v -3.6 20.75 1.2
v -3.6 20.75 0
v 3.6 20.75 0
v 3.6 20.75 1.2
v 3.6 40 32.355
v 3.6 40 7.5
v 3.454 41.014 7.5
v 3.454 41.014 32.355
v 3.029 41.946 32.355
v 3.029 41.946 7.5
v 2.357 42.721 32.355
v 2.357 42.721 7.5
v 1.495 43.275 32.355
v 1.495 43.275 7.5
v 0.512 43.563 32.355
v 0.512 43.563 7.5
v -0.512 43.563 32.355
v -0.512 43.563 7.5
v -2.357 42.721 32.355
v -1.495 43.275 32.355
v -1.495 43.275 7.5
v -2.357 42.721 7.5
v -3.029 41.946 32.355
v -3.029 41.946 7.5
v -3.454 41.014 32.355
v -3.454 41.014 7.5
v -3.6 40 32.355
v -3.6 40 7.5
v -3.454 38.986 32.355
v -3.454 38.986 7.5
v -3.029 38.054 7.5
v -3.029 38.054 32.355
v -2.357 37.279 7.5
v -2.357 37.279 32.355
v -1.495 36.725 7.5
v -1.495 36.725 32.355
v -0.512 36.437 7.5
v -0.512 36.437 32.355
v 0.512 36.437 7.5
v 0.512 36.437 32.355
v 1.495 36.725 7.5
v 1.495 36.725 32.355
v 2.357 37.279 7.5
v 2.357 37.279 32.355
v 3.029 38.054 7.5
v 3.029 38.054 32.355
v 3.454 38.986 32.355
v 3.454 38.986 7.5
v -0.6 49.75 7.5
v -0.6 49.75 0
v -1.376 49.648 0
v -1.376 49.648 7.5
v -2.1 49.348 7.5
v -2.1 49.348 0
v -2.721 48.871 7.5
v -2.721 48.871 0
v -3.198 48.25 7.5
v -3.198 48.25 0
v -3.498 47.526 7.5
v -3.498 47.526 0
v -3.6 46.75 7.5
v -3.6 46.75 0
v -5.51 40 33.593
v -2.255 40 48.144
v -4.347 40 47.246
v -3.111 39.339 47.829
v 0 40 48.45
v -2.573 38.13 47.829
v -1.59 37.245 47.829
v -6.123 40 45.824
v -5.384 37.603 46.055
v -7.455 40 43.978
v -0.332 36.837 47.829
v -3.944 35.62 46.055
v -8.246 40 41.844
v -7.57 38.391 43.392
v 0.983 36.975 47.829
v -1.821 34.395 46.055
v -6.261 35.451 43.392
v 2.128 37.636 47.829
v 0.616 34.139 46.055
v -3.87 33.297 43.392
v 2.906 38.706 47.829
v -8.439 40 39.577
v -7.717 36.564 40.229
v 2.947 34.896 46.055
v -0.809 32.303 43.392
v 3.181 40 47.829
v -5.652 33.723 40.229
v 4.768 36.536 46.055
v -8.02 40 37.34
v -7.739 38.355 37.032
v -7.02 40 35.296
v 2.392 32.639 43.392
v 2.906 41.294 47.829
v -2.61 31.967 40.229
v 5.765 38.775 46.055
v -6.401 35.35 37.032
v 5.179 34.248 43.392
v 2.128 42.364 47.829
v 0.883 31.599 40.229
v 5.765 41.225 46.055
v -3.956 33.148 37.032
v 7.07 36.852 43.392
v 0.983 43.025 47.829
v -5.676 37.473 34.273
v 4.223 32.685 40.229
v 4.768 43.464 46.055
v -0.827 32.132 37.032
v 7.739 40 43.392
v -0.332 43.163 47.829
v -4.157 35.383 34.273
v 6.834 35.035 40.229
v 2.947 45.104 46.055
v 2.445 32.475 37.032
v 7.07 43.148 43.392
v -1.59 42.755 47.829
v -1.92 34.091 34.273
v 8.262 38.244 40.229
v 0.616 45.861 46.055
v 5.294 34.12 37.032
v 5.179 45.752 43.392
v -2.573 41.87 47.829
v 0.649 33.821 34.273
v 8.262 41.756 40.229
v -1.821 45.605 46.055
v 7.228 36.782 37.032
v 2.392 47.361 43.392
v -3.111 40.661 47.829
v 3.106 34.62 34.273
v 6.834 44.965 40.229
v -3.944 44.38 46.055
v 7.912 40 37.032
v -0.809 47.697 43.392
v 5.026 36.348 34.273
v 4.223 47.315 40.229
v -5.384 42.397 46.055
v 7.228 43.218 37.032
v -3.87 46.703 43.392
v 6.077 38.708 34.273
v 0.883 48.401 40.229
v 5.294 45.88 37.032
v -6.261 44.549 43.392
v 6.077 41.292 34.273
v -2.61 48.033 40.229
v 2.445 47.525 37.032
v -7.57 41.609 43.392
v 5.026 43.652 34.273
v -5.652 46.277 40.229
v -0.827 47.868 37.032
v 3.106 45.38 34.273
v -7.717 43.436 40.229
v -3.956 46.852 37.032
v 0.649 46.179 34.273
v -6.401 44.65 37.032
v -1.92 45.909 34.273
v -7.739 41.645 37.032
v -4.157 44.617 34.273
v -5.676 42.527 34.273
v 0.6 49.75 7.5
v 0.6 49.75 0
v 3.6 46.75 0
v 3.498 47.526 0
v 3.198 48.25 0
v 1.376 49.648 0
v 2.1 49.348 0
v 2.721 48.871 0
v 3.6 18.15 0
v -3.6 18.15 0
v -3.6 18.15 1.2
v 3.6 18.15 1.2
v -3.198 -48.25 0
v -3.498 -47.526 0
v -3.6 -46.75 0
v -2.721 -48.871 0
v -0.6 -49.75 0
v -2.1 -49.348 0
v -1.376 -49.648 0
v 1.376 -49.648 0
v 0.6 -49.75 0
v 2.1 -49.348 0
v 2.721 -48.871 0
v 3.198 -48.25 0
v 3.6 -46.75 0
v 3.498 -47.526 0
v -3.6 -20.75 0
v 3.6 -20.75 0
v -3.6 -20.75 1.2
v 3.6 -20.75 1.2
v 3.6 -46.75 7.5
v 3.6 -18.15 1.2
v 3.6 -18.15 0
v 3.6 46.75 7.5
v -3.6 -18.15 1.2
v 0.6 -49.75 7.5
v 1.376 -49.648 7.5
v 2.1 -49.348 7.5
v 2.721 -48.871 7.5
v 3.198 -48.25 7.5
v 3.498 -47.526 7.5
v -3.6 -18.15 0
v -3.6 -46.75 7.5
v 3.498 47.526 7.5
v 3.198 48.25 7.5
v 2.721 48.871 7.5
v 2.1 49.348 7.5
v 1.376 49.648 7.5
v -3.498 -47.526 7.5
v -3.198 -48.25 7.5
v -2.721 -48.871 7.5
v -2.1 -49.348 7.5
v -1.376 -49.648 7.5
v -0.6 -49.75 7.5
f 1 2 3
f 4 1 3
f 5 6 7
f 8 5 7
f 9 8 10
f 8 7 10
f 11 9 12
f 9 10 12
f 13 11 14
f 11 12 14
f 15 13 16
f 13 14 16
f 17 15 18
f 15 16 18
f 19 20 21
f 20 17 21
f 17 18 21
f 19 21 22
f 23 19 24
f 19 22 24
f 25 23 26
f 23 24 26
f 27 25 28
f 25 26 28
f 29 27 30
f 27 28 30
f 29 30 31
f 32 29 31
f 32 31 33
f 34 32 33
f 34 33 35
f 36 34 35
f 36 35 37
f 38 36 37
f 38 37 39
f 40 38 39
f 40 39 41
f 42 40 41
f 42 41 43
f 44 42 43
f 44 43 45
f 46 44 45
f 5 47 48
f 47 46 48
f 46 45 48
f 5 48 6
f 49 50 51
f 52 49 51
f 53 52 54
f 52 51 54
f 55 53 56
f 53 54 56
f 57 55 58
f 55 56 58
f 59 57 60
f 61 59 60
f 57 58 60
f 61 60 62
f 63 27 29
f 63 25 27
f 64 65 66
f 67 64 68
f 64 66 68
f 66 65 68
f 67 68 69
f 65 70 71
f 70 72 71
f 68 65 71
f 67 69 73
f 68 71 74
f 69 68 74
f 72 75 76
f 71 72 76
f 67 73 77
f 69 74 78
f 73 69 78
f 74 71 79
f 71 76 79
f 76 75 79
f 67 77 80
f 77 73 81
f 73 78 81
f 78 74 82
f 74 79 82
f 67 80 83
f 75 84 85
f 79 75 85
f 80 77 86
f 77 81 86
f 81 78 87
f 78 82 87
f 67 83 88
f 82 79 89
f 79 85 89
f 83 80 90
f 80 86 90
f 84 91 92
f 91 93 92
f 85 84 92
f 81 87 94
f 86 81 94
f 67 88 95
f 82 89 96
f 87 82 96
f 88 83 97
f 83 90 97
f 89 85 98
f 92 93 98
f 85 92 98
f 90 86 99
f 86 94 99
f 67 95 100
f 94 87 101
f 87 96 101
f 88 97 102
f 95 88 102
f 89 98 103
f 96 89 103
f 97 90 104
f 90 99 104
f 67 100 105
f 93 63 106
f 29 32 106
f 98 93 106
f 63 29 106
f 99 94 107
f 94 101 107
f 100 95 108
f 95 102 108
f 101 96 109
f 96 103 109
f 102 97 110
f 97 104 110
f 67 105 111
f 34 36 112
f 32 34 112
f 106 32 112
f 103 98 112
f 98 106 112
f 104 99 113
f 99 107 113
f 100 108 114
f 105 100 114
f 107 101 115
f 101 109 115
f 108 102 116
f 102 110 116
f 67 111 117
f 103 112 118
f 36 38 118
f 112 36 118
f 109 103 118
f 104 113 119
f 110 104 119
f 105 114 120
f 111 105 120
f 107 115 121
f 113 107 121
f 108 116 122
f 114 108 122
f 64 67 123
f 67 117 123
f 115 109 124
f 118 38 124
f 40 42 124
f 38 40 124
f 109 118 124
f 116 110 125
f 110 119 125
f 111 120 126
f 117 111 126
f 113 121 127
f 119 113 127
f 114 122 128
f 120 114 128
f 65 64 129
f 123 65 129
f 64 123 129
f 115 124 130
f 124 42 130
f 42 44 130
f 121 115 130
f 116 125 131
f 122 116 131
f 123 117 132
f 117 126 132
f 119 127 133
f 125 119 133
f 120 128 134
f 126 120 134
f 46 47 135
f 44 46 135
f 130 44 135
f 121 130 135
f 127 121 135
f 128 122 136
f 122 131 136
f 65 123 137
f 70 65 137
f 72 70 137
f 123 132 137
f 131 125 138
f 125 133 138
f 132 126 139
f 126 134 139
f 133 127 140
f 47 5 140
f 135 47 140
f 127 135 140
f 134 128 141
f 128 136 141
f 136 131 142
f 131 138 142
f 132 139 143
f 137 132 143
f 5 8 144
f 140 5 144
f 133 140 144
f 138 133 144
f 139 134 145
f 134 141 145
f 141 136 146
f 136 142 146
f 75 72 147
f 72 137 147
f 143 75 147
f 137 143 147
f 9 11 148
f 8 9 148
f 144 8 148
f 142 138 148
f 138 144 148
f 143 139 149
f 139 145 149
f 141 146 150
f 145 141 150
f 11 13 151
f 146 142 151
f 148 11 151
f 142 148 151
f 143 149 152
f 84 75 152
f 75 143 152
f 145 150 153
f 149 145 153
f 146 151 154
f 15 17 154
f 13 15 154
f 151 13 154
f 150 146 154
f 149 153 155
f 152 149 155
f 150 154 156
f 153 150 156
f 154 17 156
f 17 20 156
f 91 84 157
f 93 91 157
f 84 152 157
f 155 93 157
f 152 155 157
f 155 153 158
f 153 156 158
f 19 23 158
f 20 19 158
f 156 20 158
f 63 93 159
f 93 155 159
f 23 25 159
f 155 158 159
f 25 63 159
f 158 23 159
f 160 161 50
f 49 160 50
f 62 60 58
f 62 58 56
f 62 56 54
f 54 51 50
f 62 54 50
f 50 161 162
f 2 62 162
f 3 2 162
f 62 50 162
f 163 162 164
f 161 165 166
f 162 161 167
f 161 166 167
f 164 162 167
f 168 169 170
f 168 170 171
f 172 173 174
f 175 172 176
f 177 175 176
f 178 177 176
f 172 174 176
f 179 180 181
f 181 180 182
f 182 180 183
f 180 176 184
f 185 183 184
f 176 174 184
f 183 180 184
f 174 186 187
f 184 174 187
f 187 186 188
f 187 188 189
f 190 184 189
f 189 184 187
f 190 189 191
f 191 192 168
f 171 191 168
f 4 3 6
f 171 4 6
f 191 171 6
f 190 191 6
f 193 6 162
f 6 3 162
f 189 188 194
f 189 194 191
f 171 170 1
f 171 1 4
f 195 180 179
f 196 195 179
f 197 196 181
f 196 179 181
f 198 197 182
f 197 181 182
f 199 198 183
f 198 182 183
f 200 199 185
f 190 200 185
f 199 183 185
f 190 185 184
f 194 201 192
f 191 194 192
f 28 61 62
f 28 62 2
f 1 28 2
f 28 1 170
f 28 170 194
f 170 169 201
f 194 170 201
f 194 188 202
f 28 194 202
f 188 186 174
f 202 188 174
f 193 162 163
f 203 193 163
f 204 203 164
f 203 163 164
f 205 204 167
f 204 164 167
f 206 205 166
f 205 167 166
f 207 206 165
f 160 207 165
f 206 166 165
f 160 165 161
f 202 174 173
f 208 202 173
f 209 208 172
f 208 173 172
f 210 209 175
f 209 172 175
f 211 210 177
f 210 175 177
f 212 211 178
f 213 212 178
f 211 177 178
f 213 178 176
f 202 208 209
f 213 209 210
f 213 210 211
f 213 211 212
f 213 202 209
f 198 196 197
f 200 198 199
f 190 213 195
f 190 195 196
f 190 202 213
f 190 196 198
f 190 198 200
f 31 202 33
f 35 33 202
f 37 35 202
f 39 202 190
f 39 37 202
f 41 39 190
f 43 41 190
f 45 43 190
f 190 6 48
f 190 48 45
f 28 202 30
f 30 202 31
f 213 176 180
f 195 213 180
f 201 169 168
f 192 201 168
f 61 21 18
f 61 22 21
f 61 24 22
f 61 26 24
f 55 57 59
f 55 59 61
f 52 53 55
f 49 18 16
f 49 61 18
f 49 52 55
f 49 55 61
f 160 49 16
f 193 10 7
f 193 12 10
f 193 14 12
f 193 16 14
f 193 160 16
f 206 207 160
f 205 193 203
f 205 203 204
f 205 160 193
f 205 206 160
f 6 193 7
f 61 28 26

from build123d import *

# Parameters (mm, degrees)
F1_DEPTH = 7.5
F2_W     = 7.2
F2_H     = 2.6
F3_DEPTH = 1.2
F4_R     = 3.6
F5_DEPTH = 25


with BuildPart() as f1:
    # F0 (on Top) → F1 (new body)
    with BuildSketch(Plane.XY):
        with BuildLine():
            ThreePointArc((3.6, 46.75), (2.72132, 48.87132), (0.6, 49.75))
            Line((0.6, 49.75), (-0.6, 49.75))
            ThreePointArc((-0.6, 49.75), (-2.72132, 48.87132), (-3.6, 46.75))
            Line((-3.6, 46.75), (-3.6, -46.75))
            ThreePointArc((-3.6, -46.75), (-2.72132, -48.87132), (-0.6, -49.75))
            Line((-0.6, -49.75), (0.6, -49.75))
            ThreePointArc((0.6, -49.75), (2.72132, -48.87132), (3.6, -46.75))
            Line((3.6, -46.75), (3.6, 46.75))
        make_face()
    extrude(amount=F1_DEPTH)

    # F2 (on face) → F3 (cut)
    with BuildSketch(Plane(origin=(0, 0, 0), x_dir=(1, 0, 0), z_dir=(0, 0, -1))):
        with Locations((0, 19.45)):
            Rectangle(F2_W, F2_H)
        with Locations((0, -19.45)):
            Rectangle(F2_W, F2_H)
    extrude(amount=-F3_DEPTH, mode=Mode.SUBTRACT)

    # F4 (on face) → F5 (join)
    with BuildSketch(Plane.XY.offset(7.5)):
        with Locations((0, 40)):
            Circle(F4_R)
    extrude(amount=F5_DEPTH)

    # F7 (on offset) → F8 (revolve)
    with BuildSketch(Plane.XZ.offset(-40)):
        with BuildLine():
            Line((0, 31.55), (0, 48.45))
            ThreePointArc((0, 48.45), (-8.45, 40), (0, 31.55))
        make_face()
    revolve(axis=Axis((0, 40, 40), (0, 0, 1)))


solid = f1.part
